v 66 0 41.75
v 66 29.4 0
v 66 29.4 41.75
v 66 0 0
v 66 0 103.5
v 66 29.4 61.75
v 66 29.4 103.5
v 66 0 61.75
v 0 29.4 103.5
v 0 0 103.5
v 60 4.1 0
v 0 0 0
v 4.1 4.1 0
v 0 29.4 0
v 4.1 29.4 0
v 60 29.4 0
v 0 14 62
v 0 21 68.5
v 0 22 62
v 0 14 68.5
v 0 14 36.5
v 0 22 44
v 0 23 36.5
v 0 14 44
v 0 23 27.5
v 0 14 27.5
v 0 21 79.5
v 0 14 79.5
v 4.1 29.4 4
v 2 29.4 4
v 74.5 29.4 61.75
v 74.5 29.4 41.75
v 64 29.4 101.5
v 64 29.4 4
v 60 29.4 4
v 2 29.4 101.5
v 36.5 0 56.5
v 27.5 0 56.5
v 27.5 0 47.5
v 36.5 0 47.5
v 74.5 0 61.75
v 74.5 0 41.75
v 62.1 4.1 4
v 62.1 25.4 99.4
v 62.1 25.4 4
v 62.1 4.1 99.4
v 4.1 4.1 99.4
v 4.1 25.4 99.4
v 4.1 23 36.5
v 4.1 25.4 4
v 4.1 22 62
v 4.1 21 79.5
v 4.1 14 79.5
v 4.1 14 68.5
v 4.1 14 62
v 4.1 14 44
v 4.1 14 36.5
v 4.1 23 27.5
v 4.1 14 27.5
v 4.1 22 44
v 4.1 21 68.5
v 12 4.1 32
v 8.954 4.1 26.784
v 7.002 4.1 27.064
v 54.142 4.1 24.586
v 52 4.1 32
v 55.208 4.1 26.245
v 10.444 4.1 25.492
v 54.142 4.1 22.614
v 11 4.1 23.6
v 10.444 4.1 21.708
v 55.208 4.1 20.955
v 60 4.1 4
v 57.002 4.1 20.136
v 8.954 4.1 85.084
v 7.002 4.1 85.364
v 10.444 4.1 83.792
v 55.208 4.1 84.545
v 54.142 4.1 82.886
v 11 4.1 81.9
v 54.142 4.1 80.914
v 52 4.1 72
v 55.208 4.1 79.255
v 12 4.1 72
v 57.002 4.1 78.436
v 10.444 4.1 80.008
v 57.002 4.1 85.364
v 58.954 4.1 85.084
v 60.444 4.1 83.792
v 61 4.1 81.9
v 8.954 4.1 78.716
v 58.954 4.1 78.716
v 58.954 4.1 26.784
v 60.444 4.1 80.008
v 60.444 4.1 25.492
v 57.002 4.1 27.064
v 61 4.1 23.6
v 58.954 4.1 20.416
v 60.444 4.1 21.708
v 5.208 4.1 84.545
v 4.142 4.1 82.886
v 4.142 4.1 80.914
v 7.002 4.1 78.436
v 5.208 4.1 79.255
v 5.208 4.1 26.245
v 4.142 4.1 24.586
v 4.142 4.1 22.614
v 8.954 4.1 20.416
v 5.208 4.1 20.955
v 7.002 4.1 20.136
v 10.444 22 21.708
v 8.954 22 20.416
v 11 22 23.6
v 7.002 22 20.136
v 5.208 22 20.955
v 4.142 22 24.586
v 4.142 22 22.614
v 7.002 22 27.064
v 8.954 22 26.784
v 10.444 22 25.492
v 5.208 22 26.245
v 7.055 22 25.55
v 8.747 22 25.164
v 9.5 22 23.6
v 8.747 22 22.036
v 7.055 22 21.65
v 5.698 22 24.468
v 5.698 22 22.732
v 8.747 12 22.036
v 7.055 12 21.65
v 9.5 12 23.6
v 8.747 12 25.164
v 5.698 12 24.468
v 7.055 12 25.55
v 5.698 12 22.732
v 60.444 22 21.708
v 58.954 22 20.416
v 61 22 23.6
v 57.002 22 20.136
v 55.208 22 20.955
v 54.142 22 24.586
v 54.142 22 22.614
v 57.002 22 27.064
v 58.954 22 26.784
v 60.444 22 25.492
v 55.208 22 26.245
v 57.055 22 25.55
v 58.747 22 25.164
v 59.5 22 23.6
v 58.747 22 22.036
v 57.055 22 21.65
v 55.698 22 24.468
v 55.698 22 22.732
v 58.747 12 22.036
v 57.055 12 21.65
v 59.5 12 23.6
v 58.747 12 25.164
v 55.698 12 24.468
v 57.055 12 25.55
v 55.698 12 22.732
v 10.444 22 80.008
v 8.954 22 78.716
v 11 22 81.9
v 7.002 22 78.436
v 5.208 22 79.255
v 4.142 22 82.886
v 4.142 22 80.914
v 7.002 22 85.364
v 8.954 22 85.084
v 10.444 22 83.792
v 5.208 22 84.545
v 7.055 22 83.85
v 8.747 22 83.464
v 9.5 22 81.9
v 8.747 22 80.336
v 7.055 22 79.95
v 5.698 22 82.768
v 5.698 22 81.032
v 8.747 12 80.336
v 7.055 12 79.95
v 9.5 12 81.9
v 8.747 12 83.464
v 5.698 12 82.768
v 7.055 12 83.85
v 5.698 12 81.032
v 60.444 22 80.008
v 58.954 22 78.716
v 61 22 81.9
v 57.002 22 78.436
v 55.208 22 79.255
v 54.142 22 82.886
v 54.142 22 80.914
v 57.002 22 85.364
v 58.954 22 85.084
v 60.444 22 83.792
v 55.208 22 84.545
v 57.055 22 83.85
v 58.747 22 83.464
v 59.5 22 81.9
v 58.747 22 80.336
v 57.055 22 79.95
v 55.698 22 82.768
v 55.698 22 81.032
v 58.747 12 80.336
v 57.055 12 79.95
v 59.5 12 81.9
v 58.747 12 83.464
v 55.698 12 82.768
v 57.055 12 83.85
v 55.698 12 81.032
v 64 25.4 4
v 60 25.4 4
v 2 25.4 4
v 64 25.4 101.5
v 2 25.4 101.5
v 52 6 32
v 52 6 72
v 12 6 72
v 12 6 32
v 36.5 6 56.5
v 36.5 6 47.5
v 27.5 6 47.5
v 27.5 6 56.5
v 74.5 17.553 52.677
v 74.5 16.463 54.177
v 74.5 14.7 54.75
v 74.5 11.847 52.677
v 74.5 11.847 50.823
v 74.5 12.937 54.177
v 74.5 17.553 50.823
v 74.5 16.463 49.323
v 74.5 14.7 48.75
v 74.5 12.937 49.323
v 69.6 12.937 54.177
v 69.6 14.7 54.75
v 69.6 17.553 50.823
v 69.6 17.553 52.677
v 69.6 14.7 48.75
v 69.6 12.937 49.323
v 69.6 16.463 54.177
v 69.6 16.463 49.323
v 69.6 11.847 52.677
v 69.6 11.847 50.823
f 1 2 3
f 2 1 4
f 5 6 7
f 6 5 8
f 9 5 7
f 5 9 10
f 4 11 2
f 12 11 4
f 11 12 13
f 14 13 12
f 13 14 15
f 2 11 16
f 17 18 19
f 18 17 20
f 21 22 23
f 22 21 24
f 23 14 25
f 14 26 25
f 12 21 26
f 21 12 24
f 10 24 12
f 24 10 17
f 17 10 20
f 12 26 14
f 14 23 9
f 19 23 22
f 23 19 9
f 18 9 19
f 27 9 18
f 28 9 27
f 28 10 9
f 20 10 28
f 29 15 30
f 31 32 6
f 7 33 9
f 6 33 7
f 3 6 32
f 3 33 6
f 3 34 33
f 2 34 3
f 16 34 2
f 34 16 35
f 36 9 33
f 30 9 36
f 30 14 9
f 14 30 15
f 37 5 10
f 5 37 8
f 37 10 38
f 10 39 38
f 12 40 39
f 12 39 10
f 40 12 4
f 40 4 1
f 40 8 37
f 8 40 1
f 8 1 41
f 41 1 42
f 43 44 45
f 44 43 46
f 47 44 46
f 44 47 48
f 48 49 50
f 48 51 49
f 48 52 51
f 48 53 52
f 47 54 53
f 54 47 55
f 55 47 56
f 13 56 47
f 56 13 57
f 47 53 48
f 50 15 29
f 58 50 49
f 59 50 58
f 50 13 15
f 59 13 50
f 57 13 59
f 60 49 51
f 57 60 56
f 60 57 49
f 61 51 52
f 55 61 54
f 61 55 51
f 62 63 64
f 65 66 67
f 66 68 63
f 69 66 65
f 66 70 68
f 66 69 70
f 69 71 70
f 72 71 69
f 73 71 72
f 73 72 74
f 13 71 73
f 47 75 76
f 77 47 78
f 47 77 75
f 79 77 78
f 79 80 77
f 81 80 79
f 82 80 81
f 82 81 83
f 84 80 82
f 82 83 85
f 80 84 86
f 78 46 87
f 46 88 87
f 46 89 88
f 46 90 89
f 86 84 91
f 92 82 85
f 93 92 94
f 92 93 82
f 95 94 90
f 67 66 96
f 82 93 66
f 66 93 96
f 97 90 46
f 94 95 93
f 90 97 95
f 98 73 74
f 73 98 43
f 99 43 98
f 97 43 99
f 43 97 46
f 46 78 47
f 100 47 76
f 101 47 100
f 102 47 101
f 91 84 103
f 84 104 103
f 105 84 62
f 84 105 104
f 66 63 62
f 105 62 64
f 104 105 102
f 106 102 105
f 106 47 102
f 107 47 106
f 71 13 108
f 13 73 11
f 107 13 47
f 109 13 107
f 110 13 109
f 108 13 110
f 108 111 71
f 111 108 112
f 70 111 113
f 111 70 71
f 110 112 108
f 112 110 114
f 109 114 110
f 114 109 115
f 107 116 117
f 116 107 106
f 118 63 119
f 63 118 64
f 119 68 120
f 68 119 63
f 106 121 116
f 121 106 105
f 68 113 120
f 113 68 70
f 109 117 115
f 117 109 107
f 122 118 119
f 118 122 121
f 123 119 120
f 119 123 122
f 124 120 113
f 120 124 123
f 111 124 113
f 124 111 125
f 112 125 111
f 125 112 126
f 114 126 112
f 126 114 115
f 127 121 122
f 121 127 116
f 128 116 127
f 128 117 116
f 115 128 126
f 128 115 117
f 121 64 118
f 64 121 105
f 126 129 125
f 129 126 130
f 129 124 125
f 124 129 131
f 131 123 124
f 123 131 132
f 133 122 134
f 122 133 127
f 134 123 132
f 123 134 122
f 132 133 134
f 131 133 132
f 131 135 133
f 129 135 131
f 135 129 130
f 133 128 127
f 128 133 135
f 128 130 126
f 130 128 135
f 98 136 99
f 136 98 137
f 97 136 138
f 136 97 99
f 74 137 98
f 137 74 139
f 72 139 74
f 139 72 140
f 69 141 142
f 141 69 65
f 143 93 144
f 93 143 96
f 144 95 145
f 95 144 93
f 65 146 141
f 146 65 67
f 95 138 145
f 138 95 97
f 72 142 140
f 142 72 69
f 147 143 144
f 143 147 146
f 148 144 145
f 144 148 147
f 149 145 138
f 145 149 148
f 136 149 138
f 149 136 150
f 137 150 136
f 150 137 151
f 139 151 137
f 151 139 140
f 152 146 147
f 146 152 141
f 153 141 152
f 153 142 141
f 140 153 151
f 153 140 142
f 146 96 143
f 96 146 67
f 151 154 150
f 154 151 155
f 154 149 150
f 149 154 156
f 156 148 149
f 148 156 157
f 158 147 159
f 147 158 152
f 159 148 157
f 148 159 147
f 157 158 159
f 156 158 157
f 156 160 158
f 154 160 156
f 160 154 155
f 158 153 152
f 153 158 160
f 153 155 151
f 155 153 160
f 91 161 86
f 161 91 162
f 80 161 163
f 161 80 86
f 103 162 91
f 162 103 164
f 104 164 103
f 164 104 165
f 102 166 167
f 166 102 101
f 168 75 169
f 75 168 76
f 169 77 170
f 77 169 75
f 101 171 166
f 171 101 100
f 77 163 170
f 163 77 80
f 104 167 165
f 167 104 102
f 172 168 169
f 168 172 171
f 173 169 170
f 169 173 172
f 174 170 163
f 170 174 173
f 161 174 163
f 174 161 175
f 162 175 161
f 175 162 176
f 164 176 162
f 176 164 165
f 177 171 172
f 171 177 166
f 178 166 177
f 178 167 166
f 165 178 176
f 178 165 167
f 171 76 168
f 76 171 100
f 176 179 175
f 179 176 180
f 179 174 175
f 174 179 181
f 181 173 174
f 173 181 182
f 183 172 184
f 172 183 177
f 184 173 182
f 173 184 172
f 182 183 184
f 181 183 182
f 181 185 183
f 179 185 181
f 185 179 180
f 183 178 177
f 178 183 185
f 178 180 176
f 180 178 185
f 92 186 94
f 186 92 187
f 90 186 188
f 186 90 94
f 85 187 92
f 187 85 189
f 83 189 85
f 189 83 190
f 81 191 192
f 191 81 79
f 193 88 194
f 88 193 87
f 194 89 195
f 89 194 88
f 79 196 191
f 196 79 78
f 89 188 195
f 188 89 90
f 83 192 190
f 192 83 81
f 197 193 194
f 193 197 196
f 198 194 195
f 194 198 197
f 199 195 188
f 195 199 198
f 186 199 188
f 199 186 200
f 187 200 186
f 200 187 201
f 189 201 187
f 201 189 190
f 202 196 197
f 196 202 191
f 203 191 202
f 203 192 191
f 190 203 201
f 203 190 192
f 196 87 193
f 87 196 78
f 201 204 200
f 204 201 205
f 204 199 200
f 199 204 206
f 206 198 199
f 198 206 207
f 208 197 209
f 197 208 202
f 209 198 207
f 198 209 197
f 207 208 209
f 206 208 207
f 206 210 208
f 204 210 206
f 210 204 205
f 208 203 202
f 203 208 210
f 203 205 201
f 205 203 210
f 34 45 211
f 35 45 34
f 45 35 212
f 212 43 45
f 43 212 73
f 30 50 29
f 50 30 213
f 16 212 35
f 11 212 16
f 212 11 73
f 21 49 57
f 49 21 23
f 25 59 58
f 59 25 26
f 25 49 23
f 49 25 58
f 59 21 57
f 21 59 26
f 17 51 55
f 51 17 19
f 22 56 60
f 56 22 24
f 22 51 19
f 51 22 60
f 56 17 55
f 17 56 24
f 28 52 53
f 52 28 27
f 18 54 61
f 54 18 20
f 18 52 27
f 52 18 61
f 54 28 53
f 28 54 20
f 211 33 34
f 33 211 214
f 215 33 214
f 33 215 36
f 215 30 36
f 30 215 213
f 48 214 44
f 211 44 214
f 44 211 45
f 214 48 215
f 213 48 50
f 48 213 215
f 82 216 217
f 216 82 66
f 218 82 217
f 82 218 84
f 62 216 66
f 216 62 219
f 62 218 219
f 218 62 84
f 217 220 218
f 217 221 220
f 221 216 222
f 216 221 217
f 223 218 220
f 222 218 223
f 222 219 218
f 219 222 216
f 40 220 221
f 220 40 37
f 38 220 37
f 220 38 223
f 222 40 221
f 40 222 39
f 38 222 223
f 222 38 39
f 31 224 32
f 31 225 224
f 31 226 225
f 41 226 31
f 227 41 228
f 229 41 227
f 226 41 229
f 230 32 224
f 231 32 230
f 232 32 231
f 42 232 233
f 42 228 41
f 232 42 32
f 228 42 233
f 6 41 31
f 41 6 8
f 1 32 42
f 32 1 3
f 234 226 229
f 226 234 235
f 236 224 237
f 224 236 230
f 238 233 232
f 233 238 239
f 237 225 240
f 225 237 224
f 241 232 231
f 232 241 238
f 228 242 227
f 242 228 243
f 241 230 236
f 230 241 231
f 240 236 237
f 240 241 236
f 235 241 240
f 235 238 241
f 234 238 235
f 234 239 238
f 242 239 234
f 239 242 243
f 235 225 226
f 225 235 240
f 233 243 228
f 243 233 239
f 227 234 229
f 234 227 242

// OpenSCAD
batX = 0;//22.4Ancho frente
batY = 21.4;//Alto frente
batZ = 90.5;//Profundo


pared = 4;
pared2 = 2*pared;
medPared = pared/2;

raspX = 58;
raspY = 18;
raspZ = 84.5;

h = batY+pared2;

mainAreaX = raspX+batX+pared2; 
mainAreaY = batY+pared2;
mainAreaZ = batZ+pared+5+4;

mainAreaIntX = mainAreaX-pared2;
mainAreaIntY = mainAreaY-pared;
mainAreaIntZ = mainAreaZ-pared;

x1 = pared+3.5;
z1 = 23.6;
x2 = x1+50;
x3 = pared+3.5;
z3 = 81.9;

cejaHorPosX = mainAreaX-batX-pared;
cejaVertPosX = mainAreaX-pared-2;
torH = 18+pared;


//tripod

camNonTripod();

translate([mainAreaX-1,0/*(pared2+batY-20)/2*/,(mainAreaZ/2)-10])
tripodHole();









module tripodHole()
{
difference()
{
cube([4.5+pared+1,pared2+batY,20]);
translate([pared+0.6,(pared2+batY)/2,10])
rotate([0,90,0])
cylinder(r=3,5);
}
}

module camNonTripod()
{
	baseConHome();
	translate([32,0,52])
	camHole();
}

module baseConHome()
{
	difference()
	{
		baseSinHole();

		translate([22,-1,42])
		cube([20,20,20]);
	}
}

module camHole()
{
	difference()
	{
		translate([-20,0,-20])
		cube([40,6,40]);

		translate([-4.5,-0.1,-4.5])
		cube([9,9,9]);
	}
}

module baseSinHole()
{
difference()
{
	baseHoles();

	translate([medPared,batY+pared,pared])
	doTop();	
}
}

module doTop()
{
	cube([
			mainAreaX-pared,
			pared+0.1,
			mainAreaZ-pared2+medPared
	  	]);
}

module baseHoles()
{
	difference()
	{
		baseBatTorn();
		raspHoles();
	}
}


module raspHoles()
{

	posIni = torH-pared-4;

	translate([-3,posIni,32-4.5])
	cube([pared2,9,9]);

	translate([-3,posIni,54-8-2])
	cube([pared2,8,18]);

	translate([-3,posIni,75-4.5-2])
	cube([pared2,7,11]);

}

module baseBatTorn()
{


difference()
{
	cube([
			mainAreaX,
			mainAreaY,
			mainAreaZ
	  	]);

	translate([pared+0.1,pared+0.1,-0.1])
	cube([
			mainAreaIntX,
			mainAreaIntY,
			mainAreaIntZ
	  	]);

}

//Ceja horizontal
translate([cejaHorPosX,0,0])
cube([batX+pared,pared+2,pared]);

//Ceja vertical
translate([cejaVertPosX,0,0])
cube([pared+2,pared2+batY,pared]);

//Tornillos
translate([x1,0,z1])
tornCyl();
translate([x2,0,z1])
tornCyl();
translate([x1,0,z3])
tornCyl();
translate([x2,0,z3])
tornCyl();

}











module tornCyl()
{
	rotate([-90,0,0])
	{
		difference()
		{
			cylinder(r=3.5,torH);
			translate([0,0,(torH/2)+1])
			cylinder(r=2,torH/2);
		}
	}
}





//batPosX = mainAreaX-pared-batX;
//translate([batPosX,pared,pared])
//cube([batX,batY,batZ]);
